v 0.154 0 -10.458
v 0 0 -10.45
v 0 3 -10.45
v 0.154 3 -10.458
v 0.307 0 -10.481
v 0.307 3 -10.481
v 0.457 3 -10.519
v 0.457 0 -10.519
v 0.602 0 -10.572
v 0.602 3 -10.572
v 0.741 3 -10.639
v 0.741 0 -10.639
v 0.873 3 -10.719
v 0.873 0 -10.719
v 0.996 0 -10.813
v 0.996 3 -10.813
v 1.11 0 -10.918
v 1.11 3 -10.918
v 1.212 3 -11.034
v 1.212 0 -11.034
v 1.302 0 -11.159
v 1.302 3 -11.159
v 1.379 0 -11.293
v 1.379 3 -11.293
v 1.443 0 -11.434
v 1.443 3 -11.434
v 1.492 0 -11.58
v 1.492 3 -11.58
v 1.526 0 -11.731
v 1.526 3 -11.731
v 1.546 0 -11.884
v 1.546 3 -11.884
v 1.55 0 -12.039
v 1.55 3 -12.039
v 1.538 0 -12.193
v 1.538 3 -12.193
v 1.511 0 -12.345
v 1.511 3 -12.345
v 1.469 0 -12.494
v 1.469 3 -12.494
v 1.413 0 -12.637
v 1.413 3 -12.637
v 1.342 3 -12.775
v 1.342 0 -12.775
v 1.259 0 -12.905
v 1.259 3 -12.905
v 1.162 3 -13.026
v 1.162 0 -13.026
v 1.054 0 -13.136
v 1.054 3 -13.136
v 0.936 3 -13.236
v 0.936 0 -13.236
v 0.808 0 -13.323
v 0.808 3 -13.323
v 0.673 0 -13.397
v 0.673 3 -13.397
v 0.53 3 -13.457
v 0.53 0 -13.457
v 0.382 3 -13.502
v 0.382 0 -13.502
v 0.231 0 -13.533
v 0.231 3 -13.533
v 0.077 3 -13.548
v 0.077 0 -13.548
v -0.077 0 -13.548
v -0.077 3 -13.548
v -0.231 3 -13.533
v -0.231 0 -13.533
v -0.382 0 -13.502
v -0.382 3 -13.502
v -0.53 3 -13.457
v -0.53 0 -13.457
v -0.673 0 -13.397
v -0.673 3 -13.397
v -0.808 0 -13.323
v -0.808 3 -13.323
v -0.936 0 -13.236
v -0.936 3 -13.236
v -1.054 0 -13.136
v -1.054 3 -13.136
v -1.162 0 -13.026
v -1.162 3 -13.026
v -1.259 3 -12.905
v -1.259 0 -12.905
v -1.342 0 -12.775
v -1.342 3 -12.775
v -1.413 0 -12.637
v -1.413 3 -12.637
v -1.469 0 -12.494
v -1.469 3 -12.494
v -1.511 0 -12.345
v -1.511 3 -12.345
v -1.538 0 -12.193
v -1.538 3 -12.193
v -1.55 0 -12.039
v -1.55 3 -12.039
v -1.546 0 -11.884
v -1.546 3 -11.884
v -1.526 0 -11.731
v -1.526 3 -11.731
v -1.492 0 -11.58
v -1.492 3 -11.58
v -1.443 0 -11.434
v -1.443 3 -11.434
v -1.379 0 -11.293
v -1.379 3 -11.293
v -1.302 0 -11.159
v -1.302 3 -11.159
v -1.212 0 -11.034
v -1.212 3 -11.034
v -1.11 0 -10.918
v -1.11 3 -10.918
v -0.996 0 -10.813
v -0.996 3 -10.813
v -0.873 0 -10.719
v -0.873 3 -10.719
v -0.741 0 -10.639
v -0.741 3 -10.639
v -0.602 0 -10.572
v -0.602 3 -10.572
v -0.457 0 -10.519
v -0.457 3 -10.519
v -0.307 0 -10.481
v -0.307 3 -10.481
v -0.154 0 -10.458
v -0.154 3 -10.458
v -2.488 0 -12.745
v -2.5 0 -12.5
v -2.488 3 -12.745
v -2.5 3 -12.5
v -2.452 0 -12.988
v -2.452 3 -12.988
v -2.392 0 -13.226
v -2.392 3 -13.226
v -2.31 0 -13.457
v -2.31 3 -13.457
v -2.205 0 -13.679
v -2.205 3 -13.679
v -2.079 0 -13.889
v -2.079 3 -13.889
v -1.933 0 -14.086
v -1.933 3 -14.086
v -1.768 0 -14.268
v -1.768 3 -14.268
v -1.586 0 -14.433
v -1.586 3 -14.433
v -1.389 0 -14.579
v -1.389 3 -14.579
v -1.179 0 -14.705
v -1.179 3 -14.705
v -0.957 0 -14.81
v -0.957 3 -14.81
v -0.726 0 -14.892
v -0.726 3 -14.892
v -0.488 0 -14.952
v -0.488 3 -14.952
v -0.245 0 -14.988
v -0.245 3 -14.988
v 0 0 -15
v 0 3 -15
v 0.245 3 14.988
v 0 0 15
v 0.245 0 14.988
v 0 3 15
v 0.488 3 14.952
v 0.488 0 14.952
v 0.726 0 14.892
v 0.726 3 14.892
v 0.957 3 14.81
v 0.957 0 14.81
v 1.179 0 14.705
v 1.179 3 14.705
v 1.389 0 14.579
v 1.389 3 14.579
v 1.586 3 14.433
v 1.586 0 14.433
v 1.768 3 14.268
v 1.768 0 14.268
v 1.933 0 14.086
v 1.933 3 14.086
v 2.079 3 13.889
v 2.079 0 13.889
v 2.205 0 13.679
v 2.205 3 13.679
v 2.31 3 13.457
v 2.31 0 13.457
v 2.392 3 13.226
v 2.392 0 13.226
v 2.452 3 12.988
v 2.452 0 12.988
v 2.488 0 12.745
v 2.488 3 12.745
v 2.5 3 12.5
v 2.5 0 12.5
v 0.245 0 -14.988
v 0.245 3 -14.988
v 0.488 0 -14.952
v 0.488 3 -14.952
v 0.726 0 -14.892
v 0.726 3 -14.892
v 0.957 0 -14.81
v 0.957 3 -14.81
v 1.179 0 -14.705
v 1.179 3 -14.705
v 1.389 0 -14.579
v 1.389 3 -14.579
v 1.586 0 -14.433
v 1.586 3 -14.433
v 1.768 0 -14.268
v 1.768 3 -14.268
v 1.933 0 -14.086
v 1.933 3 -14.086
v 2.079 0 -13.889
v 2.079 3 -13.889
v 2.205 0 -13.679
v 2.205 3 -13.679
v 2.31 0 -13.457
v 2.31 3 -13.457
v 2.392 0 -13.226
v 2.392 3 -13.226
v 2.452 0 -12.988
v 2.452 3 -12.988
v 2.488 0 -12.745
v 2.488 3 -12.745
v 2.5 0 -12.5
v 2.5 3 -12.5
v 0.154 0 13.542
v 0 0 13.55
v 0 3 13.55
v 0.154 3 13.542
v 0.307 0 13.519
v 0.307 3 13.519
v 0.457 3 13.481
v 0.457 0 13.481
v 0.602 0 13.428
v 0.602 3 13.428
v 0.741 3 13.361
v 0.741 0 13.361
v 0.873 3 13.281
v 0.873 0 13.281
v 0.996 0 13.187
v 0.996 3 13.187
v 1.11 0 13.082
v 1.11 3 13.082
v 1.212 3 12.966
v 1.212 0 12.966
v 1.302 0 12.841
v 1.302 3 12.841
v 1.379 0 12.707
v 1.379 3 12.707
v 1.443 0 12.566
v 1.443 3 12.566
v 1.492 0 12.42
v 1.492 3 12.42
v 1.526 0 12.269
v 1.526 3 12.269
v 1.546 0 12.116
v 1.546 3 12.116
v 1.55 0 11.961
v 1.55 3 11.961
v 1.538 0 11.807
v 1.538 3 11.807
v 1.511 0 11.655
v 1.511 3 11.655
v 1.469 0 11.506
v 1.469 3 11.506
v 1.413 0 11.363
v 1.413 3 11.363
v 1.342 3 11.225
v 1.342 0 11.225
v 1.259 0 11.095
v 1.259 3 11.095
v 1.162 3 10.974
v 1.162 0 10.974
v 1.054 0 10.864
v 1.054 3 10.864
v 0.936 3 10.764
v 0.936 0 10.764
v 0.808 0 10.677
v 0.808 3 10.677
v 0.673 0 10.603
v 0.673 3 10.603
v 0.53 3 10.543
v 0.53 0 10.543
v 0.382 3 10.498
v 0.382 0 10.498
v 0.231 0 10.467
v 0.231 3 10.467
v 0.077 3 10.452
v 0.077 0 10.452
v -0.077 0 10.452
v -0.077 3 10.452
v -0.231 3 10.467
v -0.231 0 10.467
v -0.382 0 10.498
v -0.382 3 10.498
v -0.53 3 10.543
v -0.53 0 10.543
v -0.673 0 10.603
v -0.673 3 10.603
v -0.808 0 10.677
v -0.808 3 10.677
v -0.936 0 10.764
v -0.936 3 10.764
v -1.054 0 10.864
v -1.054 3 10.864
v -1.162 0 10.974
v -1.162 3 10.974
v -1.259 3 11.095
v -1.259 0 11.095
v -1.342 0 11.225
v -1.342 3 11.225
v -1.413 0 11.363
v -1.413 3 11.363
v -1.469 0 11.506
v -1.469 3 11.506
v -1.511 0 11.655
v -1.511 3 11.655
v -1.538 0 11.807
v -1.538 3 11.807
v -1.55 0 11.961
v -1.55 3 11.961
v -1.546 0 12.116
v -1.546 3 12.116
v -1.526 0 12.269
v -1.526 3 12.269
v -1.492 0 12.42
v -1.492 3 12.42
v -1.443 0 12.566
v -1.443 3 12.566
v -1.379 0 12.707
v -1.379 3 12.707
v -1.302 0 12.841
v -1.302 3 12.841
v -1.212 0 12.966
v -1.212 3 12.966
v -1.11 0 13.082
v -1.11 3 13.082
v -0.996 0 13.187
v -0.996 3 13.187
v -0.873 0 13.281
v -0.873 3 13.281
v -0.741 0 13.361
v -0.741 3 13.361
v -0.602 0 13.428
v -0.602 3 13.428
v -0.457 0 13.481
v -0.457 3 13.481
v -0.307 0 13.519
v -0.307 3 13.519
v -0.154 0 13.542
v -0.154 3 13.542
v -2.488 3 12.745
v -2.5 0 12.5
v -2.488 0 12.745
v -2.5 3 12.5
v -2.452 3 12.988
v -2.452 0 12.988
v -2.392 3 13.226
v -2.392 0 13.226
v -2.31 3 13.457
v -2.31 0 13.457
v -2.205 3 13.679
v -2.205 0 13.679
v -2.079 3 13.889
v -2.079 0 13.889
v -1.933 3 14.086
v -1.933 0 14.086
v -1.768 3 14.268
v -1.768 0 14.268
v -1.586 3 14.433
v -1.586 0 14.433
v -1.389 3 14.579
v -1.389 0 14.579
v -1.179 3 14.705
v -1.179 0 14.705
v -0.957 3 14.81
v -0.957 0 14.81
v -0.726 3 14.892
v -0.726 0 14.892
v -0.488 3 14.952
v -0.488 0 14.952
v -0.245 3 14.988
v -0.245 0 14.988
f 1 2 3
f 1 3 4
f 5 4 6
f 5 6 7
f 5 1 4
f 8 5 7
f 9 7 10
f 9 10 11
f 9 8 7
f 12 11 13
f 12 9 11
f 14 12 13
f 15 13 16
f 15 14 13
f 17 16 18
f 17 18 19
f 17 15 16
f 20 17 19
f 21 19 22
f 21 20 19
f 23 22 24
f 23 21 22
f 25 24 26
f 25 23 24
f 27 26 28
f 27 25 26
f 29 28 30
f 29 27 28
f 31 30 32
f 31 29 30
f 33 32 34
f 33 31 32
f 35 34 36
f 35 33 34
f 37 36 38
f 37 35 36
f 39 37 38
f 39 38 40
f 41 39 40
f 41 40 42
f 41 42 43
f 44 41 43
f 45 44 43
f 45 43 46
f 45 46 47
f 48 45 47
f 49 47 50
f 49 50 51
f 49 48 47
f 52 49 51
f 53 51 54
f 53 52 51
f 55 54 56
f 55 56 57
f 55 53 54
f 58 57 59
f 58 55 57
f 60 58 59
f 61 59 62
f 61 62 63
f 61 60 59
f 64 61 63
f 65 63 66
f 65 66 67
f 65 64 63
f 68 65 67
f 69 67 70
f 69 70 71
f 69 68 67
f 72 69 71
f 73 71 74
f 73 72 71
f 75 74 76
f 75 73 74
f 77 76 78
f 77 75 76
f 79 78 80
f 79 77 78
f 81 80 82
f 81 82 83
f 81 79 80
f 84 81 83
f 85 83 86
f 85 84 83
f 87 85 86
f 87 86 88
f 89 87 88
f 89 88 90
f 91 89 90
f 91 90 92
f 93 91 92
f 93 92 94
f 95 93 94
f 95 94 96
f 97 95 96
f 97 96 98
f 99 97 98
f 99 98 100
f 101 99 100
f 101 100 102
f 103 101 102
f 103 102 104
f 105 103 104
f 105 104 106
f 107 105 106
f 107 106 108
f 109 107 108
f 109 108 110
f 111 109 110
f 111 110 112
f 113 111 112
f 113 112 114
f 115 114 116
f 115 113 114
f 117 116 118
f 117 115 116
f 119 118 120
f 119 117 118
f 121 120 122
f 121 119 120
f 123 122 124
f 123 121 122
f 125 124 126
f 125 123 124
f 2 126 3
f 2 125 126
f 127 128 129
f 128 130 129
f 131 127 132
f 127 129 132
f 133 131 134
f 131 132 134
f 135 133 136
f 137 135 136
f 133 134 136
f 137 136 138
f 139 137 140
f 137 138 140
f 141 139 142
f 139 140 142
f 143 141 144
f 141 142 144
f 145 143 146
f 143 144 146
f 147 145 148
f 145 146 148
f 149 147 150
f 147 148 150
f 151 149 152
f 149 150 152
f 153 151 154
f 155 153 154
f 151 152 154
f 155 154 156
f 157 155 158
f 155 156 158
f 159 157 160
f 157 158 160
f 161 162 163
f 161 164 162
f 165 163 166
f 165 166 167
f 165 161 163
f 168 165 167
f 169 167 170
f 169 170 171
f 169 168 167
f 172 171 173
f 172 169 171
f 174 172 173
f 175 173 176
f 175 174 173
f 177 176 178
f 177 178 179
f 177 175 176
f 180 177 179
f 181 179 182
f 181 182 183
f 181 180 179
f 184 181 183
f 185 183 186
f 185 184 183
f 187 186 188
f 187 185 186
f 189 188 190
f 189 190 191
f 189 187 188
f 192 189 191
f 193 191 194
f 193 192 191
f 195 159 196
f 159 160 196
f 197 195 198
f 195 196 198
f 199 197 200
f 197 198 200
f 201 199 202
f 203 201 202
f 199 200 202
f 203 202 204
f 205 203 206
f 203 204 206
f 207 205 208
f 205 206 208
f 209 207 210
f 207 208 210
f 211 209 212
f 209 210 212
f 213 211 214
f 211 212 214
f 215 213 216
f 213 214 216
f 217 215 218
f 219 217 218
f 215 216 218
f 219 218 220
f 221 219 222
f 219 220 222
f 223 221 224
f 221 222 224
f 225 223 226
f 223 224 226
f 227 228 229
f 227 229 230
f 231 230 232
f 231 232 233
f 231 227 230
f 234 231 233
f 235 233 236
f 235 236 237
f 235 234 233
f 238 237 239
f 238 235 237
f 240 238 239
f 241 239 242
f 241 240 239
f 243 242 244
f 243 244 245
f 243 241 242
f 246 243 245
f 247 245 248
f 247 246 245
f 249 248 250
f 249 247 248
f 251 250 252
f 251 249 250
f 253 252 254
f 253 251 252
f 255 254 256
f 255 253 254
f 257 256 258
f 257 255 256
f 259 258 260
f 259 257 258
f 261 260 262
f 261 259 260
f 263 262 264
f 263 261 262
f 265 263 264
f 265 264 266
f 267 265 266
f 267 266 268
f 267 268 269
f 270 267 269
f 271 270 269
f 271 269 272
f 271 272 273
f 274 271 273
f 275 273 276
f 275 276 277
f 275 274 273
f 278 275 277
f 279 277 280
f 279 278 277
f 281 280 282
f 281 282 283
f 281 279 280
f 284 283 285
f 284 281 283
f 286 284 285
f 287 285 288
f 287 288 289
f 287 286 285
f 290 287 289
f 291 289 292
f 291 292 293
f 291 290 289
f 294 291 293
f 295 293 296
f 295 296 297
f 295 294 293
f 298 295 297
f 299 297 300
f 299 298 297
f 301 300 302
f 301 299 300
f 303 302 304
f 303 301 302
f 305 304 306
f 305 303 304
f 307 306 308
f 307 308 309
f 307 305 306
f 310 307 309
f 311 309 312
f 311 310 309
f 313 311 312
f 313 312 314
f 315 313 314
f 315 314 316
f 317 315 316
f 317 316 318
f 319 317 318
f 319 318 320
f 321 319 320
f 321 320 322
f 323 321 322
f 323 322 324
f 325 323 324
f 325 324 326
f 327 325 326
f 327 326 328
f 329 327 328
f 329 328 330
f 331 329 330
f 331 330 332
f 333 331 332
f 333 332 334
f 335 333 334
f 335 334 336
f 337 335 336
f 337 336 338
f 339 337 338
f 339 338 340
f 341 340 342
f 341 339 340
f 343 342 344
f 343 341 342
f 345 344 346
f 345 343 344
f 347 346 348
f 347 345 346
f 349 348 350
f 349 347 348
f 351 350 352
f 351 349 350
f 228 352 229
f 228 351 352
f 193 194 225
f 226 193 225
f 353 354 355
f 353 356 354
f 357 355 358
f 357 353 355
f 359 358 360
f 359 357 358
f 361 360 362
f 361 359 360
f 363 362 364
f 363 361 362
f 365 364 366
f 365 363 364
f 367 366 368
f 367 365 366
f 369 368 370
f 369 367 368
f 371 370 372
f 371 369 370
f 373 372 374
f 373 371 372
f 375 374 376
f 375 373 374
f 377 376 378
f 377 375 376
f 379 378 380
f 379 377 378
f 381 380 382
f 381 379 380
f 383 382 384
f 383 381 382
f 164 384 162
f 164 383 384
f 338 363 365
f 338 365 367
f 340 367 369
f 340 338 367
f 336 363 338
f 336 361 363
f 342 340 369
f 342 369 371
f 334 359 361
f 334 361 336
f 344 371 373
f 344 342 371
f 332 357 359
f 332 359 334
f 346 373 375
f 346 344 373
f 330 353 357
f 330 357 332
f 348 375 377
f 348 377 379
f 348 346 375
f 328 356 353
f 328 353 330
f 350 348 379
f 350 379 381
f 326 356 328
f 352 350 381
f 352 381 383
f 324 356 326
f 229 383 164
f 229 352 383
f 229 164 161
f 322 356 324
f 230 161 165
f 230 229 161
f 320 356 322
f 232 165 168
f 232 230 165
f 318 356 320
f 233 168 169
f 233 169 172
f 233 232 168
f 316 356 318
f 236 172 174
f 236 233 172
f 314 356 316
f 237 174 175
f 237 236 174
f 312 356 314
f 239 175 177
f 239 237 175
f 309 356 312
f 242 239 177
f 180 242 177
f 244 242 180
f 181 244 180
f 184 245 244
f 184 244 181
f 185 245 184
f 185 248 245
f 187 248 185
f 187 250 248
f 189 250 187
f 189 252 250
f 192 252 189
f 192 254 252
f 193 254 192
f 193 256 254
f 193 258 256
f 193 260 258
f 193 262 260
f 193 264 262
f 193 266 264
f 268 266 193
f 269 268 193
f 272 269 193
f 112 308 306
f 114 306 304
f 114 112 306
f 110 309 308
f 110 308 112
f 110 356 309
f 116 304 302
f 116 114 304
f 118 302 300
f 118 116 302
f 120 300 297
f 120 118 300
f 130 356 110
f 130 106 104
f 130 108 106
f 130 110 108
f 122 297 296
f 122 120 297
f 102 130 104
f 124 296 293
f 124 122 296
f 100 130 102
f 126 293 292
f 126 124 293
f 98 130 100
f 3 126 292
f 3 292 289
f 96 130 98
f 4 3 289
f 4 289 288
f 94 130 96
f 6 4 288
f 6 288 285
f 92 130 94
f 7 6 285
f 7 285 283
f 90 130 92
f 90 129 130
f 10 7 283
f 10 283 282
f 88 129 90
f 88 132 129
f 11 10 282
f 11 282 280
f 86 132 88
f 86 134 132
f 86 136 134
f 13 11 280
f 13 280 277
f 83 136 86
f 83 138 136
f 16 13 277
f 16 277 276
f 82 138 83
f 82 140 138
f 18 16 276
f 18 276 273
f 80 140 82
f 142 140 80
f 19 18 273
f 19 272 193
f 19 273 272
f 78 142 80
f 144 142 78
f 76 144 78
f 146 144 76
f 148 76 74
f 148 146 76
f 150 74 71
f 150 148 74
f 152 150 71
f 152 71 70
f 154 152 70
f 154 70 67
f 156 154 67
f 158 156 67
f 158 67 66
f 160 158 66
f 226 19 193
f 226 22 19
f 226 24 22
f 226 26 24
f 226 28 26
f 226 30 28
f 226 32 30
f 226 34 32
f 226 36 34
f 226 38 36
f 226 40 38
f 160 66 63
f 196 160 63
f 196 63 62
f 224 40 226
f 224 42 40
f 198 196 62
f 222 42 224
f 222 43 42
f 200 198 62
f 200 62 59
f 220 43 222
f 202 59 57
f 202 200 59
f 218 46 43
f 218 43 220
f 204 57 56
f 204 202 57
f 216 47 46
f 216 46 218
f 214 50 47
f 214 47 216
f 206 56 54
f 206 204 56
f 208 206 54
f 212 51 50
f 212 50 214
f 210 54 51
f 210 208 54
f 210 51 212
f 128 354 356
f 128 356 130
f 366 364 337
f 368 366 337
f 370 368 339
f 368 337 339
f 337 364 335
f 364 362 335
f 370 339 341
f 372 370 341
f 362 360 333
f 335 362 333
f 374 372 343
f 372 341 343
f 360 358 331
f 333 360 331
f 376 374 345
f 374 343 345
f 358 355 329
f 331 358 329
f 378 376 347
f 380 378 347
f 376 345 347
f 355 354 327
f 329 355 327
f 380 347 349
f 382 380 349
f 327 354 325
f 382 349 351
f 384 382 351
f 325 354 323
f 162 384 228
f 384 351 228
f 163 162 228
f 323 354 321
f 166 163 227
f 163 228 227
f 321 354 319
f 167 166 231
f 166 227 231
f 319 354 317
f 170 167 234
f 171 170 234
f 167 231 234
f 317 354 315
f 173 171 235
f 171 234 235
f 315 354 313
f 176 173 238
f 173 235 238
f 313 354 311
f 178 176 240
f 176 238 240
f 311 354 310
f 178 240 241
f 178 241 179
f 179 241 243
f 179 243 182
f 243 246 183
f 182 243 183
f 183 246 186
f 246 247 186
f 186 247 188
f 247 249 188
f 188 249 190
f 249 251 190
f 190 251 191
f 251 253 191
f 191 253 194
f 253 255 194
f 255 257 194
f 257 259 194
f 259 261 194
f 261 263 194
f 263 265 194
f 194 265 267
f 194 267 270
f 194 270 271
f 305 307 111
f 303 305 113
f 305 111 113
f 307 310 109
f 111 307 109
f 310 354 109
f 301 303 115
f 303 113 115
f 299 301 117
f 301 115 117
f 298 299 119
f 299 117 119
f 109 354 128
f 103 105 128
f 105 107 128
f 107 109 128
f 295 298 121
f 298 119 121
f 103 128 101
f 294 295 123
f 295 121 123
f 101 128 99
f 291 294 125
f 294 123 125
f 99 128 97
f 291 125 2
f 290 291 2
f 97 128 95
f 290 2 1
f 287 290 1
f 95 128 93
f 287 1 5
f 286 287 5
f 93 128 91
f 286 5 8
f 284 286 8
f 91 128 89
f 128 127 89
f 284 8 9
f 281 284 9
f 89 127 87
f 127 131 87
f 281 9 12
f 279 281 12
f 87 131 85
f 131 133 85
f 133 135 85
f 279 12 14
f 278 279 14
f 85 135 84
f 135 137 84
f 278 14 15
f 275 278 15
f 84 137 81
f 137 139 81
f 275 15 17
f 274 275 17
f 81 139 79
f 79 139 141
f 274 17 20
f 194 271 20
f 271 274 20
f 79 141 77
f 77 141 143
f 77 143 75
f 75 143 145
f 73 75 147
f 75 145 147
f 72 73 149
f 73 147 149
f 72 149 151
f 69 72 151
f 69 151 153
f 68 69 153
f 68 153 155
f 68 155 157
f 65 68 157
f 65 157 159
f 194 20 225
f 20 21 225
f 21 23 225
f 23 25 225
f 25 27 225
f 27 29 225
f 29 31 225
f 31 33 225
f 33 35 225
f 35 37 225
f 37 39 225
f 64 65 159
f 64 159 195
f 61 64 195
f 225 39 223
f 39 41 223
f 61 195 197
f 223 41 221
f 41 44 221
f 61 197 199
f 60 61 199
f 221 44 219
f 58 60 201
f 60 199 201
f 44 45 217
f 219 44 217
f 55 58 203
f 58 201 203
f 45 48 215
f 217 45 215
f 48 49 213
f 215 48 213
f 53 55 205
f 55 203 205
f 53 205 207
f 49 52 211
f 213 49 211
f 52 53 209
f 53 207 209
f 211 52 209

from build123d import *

# Parameters (mm, degrees)
SKETCH1_W           = 5
SKETCH1_H           = 30
SKETCH1_R           = 1.55
BOSS_EXTRUDE1_DEPTH = 3
FILLET1_R           = 2.5


with BuildPart() as part:
    # Sketch1 → Boss-Extrude1 (new body)
    with BuildSketch(Plane(origin=(0, 0, 0), x_dir=(1, 0, 0), z_dir=(0, 1, 0))):
        Rectangle(SKETCH1_W, SKETCH1_H)
        with Locations(Location((0, 12, 0), (0, 0, 270))):
            Circle(SKETCH1_R, mode=Mode.SUBTRACT)
        with Locations(Location((0, -12, 0), (0, 0, 270))):
            Circle(SKETCH1_R, mode=Mode.SUBTRACT)
    extrude(amount=BOSS_EXTRUDE1_DEPTH)

    # Fillet1
    fillet1_edges = [part.edges().sort_by_distance(p)[0] for p in [
        (-2.5, 1.5, 15),
        (-2.5, 1.5, -15),
        (2.5, 1.5, -15),
        (2.5, 1.5, 15),
    ]]
    fillet(fillet1_edges, radius=FILLET1_R - 0.0001)  # a hair under: the kernel refuses the full size


solid = part.part
